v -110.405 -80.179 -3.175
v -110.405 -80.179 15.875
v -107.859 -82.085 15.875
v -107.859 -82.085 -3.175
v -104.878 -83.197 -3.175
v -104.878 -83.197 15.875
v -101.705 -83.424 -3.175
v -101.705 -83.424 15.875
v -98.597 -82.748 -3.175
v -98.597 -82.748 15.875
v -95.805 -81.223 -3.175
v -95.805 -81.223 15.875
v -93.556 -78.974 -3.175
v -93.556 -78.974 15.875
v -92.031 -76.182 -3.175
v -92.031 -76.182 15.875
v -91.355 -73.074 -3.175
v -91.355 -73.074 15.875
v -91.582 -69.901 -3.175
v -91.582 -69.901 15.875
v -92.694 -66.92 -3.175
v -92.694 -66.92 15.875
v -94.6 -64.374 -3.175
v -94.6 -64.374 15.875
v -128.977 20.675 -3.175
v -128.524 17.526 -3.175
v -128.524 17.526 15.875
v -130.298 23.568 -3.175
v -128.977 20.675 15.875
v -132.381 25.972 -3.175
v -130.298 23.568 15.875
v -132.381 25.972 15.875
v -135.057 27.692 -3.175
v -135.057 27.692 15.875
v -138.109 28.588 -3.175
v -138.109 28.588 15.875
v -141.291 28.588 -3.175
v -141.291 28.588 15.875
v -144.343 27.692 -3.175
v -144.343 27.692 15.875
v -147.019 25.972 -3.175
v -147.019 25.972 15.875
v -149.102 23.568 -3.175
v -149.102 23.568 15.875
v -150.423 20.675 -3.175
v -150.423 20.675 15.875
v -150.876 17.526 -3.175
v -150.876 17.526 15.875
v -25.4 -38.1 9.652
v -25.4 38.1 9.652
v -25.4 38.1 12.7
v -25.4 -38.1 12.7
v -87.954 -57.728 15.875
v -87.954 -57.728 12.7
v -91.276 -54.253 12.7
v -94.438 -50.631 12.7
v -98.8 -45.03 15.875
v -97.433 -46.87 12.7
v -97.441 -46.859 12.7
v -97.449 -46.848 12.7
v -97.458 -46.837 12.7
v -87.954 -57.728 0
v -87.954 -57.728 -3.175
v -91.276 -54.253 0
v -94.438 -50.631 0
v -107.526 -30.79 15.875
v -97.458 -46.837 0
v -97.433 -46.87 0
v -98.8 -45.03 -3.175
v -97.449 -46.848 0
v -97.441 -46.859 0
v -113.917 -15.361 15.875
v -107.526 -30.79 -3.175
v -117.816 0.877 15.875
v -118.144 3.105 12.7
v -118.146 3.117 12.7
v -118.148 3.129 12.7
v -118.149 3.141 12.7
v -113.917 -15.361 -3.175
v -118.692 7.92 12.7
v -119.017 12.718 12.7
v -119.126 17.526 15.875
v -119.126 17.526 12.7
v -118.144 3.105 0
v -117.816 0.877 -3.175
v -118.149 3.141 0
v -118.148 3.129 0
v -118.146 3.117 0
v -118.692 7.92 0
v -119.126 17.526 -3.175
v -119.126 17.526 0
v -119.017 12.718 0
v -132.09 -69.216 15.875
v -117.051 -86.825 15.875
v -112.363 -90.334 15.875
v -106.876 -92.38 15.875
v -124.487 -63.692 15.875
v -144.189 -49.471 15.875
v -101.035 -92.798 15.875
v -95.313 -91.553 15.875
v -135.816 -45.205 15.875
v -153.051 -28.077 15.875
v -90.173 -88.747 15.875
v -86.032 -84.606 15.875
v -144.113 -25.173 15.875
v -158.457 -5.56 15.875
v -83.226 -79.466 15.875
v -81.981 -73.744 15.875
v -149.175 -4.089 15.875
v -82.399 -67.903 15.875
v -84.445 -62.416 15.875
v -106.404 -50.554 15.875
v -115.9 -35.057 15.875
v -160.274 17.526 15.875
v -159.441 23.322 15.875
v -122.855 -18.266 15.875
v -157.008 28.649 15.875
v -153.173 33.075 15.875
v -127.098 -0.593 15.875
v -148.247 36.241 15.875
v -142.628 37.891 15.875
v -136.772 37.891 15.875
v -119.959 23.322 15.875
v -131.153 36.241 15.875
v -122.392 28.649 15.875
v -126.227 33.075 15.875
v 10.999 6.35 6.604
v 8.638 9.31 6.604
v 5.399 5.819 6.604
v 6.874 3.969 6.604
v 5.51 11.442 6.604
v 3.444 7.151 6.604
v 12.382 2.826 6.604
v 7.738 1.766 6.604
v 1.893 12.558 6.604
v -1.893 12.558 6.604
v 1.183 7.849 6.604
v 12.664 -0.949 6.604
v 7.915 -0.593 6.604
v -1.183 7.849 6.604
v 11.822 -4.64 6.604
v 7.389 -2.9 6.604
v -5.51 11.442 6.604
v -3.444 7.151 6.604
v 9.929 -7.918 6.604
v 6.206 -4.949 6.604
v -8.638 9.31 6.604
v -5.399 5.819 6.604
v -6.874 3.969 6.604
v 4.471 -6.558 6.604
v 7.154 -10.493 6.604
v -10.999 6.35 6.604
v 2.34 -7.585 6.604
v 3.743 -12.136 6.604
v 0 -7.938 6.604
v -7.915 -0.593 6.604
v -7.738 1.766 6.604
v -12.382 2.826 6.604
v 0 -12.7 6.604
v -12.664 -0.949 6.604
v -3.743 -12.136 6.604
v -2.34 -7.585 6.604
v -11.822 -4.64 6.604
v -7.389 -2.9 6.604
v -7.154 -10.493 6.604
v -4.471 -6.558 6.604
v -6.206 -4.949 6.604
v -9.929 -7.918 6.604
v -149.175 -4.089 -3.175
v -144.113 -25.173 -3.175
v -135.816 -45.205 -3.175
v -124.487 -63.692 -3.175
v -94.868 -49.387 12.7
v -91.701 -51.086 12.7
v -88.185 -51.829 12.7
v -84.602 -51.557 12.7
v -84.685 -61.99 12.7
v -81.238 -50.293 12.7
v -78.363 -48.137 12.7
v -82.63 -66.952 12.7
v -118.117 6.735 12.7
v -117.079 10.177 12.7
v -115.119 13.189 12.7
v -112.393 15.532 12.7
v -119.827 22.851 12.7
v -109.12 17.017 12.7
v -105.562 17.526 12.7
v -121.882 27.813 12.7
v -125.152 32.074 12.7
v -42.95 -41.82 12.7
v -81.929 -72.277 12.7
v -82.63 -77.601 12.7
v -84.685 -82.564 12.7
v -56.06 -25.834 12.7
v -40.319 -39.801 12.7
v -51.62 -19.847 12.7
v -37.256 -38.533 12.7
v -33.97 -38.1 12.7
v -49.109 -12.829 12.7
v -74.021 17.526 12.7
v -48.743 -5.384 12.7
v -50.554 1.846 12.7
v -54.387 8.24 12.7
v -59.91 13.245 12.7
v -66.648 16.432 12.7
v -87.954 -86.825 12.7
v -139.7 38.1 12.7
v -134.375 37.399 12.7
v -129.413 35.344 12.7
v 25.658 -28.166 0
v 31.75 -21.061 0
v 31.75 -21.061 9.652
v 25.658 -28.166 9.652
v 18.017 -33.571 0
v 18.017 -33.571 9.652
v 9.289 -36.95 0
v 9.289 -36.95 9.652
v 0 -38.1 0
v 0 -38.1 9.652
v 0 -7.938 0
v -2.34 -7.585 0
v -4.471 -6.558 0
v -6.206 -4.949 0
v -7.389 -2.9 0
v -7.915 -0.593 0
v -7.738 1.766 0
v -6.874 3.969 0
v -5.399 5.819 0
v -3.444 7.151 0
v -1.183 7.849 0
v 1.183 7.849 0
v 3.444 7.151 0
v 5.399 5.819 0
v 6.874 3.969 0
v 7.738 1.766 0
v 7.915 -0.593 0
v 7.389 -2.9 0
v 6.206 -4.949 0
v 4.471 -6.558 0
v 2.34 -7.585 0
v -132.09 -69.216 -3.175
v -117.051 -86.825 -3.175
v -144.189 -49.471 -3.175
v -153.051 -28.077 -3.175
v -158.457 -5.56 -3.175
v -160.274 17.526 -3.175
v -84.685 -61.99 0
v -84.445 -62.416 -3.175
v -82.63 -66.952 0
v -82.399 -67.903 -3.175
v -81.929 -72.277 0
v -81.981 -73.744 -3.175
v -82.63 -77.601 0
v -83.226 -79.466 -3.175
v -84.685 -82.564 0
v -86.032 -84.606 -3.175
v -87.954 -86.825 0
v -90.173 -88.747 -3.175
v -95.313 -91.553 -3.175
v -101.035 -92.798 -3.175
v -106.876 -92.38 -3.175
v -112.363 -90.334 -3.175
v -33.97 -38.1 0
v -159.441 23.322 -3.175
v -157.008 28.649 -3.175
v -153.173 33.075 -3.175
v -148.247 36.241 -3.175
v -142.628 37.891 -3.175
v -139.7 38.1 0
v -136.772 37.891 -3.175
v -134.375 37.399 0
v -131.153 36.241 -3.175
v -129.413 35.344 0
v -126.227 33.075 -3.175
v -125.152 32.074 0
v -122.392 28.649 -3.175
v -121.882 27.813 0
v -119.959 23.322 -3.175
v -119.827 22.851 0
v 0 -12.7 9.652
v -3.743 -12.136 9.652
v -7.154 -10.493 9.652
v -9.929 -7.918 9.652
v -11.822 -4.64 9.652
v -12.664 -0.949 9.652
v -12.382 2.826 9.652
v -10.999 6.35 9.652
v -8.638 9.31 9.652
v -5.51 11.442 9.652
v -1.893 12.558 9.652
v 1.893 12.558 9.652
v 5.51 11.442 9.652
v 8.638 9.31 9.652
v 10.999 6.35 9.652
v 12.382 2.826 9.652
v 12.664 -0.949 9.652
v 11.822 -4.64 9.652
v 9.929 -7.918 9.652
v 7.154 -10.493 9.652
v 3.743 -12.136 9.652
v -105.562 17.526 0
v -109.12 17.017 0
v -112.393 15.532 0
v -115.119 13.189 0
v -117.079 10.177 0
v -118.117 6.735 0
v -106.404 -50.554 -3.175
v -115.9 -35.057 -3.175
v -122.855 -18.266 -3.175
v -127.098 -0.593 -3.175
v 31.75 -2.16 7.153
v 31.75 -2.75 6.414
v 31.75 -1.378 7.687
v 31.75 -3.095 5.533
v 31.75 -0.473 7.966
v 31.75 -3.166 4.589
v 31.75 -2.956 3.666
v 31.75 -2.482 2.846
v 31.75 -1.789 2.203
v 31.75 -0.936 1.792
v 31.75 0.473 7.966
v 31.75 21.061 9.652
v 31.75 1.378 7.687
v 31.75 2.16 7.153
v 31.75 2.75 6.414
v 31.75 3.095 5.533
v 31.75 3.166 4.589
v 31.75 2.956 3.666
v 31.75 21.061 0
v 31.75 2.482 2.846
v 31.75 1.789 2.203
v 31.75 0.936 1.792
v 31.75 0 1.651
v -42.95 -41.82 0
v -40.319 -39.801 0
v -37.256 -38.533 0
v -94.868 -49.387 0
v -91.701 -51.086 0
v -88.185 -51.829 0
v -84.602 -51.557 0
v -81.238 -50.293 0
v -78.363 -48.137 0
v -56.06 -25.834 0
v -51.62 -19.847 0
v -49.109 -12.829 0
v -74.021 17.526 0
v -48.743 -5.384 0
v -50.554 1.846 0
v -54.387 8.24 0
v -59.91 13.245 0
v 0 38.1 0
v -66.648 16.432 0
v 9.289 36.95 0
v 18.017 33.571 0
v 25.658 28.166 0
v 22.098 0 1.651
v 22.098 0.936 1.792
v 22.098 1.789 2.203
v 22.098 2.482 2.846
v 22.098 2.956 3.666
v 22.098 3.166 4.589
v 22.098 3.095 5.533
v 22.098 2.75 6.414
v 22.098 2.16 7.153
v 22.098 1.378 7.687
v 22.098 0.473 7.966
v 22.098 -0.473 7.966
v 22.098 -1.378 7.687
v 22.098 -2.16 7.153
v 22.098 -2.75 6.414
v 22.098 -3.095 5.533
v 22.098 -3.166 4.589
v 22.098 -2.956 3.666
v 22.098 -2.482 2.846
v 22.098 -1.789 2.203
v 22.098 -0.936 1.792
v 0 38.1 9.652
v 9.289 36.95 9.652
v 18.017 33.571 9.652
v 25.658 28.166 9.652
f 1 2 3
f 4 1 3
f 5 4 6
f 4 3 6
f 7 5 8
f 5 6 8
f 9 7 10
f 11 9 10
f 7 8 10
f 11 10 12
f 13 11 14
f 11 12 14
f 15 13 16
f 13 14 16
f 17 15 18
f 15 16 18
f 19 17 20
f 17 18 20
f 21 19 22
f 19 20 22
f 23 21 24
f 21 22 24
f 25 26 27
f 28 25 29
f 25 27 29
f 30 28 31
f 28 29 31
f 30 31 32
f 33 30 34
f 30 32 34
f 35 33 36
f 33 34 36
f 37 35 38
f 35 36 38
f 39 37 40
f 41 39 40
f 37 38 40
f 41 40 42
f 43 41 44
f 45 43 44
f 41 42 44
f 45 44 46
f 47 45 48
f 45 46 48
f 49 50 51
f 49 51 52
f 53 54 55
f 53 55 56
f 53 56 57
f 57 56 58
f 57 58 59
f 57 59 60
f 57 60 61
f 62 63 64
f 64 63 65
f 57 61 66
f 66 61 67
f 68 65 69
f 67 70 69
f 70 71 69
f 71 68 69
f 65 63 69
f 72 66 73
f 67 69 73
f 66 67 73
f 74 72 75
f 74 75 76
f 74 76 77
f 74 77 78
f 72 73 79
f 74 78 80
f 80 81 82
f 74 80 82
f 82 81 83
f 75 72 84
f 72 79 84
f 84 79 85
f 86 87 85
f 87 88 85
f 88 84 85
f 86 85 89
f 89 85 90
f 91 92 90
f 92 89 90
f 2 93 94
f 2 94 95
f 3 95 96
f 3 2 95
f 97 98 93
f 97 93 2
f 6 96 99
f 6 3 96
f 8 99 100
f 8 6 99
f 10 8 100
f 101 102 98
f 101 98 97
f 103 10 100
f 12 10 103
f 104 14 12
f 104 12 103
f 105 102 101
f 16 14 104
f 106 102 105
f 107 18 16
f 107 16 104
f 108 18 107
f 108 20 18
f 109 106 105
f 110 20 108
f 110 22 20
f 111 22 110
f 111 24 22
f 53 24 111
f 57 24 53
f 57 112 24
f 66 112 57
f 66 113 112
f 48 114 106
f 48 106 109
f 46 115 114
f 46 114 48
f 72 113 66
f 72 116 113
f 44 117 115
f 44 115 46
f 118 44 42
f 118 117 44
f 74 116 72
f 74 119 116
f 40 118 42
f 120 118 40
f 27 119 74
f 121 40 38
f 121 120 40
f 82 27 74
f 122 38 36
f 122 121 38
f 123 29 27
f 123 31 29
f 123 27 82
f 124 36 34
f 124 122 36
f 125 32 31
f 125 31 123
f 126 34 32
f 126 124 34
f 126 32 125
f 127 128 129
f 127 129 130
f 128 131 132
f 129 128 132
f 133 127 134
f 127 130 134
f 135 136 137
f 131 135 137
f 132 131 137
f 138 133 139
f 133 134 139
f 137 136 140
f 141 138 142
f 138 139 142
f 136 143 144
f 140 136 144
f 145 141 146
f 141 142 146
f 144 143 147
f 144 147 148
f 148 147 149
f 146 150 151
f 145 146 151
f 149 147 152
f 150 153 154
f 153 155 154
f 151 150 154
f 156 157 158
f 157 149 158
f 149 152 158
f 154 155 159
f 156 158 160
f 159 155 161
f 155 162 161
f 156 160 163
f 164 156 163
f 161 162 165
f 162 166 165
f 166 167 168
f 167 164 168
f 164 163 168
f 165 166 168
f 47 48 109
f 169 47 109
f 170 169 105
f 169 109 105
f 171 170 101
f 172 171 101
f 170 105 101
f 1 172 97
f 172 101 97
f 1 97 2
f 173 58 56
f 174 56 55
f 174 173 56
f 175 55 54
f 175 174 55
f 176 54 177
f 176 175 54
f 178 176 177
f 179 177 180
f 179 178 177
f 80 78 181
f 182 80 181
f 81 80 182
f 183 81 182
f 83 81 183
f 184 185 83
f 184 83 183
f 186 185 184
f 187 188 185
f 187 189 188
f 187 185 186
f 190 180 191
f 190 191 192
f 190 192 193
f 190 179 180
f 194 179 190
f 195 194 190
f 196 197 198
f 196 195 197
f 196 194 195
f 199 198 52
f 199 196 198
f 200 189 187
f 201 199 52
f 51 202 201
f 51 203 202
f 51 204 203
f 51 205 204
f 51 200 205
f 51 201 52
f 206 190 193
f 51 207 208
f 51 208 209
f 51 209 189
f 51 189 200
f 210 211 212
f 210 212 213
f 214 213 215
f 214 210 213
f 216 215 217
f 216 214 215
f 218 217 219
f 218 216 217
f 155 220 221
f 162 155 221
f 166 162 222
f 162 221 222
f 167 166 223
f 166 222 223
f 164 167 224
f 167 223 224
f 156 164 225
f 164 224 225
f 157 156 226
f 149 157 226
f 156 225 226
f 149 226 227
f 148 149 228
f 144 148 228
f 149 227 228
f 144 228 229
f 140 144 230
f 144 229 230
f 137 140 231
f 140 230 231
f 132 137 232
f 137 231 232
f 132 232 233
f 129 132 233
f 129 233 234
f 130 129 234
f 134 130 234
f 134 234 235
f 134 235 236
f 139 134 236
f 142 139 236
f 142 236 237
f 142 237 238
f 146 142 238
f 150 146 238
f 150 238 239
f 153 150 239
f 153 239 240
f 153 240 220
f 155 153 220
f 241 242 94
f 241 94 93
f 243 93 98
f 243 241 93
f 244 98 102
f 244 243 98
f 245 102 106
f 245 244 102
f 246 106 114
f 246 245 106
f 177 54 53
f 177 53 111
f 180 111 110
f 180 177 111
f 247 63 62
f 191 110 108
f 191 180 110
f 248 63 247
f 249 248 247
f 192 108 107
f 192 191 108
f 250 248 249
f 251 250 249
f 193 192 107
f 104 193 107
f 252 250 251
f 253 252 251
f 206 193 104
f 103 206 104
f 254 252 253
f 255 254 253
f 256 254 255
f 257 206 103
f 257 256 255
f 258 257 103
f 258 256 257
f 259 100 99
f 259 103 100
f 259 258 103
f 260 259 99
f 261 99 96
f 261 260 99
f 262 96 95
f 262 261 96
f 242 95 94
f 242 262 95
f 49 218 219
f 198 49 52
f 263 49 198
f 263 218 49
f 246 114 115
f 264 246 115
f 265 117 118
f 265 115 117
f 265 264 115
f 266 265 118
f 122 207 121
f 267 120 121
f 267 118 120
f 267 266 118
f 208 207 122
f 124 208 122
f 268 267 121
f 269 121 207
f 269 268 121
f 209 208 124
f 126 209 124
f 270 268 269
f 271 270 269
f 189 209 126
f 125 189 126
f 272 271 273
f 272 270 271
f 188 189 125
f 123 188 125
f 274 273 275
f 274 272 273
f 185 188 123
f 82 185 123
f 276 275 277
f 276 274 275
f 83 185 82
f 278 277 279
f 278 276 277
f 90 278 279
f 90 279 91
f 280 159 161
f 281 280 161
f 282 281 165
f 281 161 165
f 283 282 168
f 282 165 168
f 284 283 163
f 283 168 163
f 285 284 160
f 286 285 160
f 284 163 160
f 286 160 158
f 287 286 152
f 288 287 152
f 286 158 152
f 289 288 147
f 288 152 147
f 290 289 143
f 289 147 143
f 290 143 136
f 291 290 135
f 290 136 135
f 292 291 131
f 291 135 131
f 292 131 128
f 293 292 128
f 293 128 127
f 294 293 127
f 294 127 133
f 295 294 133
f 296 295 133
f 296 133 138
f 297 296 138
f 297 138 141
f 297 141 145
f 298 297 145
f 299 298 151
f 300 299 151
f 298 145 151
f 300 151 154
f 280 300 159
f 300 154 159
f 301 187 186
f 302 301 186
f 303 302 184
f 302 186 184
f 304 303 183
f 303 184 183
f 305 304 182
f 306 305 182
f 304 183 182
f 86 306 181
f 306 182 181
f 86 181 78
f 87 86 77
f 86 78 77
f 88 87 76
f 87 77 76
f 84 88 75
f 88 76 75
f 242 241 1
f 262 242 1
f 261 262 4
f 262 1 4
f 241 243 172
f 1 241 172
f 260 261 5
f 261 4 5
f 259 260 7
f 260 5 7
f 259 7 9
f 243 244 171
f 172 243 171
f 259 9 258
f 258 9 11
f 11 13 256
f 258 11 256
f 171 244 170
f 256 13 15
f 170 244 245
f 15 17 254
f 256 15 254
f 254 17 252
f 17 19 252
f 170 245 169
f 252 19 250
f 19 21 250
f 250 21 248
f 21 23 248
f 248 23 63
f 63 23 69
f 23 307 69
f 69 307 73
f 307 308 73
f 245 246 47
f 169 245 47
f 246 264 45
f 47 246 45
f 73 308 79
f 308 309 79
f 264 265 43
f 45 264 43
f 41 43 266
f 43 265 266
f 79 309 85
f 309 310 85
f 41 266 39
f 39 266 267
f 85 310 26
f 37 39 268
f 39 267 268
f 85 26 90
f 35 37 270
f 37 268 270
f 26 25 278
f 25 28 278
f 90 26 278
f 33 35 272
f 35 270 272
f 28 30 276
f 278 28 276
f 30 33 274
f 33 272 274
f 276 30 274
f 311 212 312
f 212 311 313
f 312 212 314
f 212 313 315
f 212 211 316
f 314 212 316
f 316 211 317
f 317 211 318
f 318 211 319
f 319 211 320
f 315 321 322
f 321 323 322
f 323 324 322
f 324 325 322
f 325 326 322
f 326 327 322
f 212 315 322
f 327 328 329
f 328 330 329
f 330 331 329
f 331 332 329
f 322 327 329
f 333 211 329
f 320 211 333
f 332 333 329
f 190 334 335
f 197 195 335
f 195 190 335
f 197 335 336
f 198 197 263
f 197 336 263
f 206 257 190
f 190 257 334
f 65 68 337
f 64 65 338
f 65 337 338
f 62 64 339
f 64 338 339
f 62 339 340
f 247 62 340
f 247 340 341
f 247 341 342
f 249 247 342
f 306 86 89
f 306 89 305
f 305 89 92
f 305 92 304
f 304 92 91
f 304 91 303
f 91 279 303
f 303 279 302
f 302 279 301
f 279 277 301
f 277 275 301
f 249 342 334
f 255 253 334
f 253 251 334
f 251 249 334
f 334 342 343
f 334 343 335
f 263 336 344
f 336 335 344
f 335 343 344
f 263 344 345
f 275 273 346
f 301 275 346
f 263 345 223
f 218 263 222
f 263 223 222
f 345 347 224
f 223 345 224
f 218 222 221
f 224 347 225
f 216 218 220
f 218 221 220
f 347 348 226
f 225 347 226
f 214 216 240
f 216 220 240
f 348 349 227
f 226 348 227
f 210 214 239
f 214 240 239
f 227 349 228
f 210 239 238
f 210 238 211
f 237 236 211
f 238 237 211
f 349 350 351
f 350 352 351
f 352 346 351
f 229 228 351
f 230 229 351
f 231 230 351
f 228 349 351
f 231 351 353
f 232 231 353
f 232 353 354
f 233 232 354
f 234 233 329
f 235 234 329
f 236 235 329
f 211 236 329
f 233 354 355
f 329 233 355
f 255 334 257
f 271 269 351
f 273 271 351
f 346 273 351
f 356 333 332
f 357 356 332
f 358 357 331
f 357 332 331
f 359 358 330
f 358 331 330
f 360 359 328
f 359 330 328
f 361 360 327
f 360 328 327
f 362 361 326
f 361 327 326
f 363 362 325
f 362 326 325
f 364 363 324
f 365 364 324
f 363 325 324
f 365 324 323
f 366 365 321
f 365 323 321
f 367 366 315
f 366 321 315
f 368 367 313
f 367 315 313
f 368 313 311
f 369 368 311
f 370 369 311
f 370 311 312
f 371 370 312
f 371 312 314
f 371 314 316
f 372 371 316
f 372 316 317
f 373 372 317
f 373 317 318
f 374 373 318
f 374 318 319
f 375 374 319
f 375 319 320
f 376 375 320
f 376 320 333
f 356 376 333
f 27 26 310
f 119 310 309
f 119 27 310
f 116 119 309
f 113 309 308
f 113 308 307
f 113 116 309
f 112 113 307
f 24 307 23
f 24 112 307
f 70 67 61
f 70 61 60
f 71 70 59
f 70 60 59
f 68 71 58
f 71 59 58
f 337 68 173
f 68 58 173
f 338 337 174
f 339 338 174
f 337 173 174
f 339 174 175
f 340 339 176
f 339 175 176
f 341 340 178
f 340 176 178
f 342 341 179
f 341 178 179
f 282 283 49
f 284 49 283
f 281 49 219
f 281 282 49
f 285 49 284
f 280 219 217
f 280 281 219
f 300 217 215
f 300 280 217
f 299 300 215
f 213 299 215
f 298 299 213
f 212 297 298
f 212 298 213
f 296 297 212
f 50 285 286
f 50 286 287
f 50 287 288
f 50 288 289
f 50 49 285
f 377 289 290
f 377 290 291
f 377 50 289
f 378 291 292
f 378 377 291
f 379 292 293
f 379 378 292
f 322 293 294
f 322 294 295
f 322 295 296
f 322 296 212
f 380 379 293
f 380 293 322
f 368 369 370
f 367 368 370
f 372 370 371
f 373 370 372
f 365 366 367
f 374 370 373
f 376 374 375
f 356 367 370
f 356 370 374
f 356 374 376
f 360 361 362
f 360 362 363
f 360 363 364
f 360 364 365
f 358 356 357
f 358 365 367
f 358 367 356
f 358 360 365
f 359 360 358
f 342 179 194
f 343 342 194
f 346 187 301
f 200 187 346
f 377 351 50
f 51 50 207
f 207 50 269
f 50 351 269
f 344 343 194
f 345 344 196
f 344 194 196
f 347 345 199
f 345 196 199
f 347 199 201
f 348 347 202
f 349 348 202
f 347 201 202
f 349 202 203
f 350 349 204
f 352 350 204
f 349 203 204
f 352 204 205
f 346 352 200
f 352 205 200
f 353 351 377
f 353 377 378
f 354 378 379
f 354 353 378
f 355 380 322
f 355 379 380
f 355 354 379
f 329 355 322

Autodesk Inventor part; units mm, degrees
sketch "Boceto1" plane through (0, 0, 0) normal (0, 0, 1) x (1, 0, 0)
  line L0 (-37.2583, 0) -> (45.75, 0) construction
  line L1 (0, -58.9269) -> (0, 58.9269) construction
  line L2 (31.75, -21.0606) -> (31.75, 21.0606)
  line L3 (0, 38.1) -> (-25.4, 38.1)
  line L4 (0, -38.1) -> (-25.4, -38.1)
  arc A0 (31.75, 21.0606) -> (0, 38.1) centre (0, 0) ccw
  arc A1 (0, -38.1) -> (31.75, -21.0606) centre (0, 0) ccw
  line L5 (-25.4, 38.1) -> (-25.4, -38.1)
  dimension "d2" = 31.75
  dimension "d3" = 25.4
extrude "Cabezal" add sketch "Boceto1" along normal blind 9.652
sketch "Boceto3" plane through (0, 0, 9.652) normal (0, 0, 1) x (1, 0, 0)
  point P0 (0, 0)
  point P1 (0, 0)
hole "Broca y barreno" at (0, 0, 9.652) direction (0, 0, -1) diameter 15.875 end through all counterbore diameter 25.4 counterbore depth 3.048
sketch "Boceto4" plane through (0, 0, 0) normal (0, 0, 1) x (1, 0, 0)
  line L0 (-36.83, 0) -> (43.18, 0) construction
  line L1 (0, -53.34) -> (0, 53.34) construction
  line L2 (-12.7, 17.526) -> (-227.4102, 17.526) construction
  arc A0 (-119.126, 17.526) -> (-160.274, 17.526) centre (-139.7, 17.526) ccw
  line L3 (-12.7, 17.526) -> (-138.4236, -108.1976) construction
  line L4 (-12.7, 17.526) -> (165.1, 17.526) construction
  arc A1 (-117.0506, -86.8246) -> (-87.9545, -57.7285) centre (-102.5026, -72.2766) ccw
  arc A2 (-160.274, 17.526) -> (-117.0506, -86.8246) centre (-12.7, 17.526) ccw
  arc A3 (-119.126, 17.526) -> (-87.9545, -57.7285) centre (-12.7, 17.526) ccw
  line L5 (-25.4, 38.1) -> (-25.4, -38.1) projected
  point P0 (0, 0)
  dimension "d14" = 17.526
  dimension "d15" = 12.7
  dimension "d19" = 41.148
  dimension "d21" = 135
  dimension "d22" = 41.148
  dimension "d25" = 12.7
extrude "Mango" add sketch "Boceto4" along normal blind 15.875 and the other way blind 3.175
sketch "Boceto8" plane through (31.75, -21.0606, 0) normal (1, 0, 0) x (0, 0, -1)
  circle A0 centre (-4.826, 21.0606) radius 3.175
  line L0 (-9.652, 0) -> (-9.652, 42.1211) construction
  line L1 (0, 0) -> (-9.652, 0) construction
  line L2 (0, 42.1211) -> (-9.652, 42.1211) construction
  line L3 (-6.604, 33.7606) -> (-6.604, 8.3606) projected
  line L4 (-6.604, 28.9981) -> (-6.604, 13.1231) projected
  point P0 (0, 21.0606)
  dimension "d36" = 6.35
  dimension "d37" = 4.826
  dimension "d38" = 42.1211
  dimension "d39" = 21.0606
extrude "AgujeroLateral" cut sketch "Boceto8" against normal blind 9.652
sketch "Boceto9" plane through (0, 0, 0) normal (0, 0, 1) x (1, 0, 0)
  arc A0 (-160.274, 17.526) -> (-119.126, 17.526) centre (-139.7, 17.526) ccw projected
  line L0 (-25.4, 38.1) -> (-25.4, -38.1) projected
  line L1 (-139.7, 38.1) -> (-25.4, 38.1)
  arc A1 (-119.126, 17.526) -> (-160.274, 17.526) centre (-139.7, 17.526) ccw projected
  line L2 (-25.4, -38.1) -> (0, -38.1) projected
  line L3 (-25.4, 38.1) -> (-25.4, -38.1)
  line L4 (-25.4, -38.1) -> (-33.9695, -38.1)
  arc A2 (-87.9545, -57.7285) -> (-117.0506, -86.8246) centre (-102.5026, -72.2766) ccw projected
  arc A3 (-160.274, 17.526) -> (-117.0506, -86.8246) centre (-12.7, 17.526) ccw projected
  arc A4 (-117.0506, -86.8246) -> (-87.9545, -57.7285) centre (-102.5026, -72.2766) ccw projected
  arc A5 (-119.126, 17.526) -> (-87.9545, -57.7285) centre (-12.7, 17.526) ccw projected
  arc A6 (-119.126, 17.526) -> (-160.274, 17.526) centre (-139.7, 17.526) ccw projected
  line L5 (10.5292, 11.6592) -> (185.2985, 11.6592) construction
  arc A7 (-117.0506, -86.8246) -> (-87.9545, -57.7285) centre (-102.5026, -72.2766) ccw construction
  line L6 (-87.9545, -86.8246) -> (-42.9497, -41.8197)
  line L7 (-139.7, 17.526) -> (0, 17.526) construction
  line L8 (0, 17.526) -> (-119.126, -101.6) construction
  arc A8 (-33.9695, -38.1) -> (-42.9497, -41.8197) centre (-33.9695, -50.8) ccw
  line L9 (-25.4, 38.1) -> (-25.4, -38.1)
  arc A9 (-87.9545, -57.7285) -> (-119.126, 17.526) centre (-12.7, 17.526) ccw projected
  arc A10 (-119.126, 17.526) -> (-87.9545, -57.7285) centre (-12.7, 17.526) ccw
  circle A11 centre (-139.7, 17.526) radius 20.574
  circle A12 centre (-102.5026, -72.2766) radius 20.574
  point P0 (0, 0)
  point P1 (-87.9545, -57.7285)
  point P2 (-119.126, 17.526)
  dimension "d47" = 45
  dimension "d48" = 12.7
extrude "BloqueCentral" add sketch "Boceto9" along normal blind 12.7 contours A9 L1 L0 L4 A8 L6 A5 | A1 L1 A9 | A9 L6 A4
sketch "Boceto10" plane through (0, 0, 15.875) normal (0, 0, 1) x (1, 0, 0)
  arc A0 (-160.274, 17.526) -> (-117.0506, -86.8246) centre (-12.7, 17.526) ccw construction
  arc A1 (-117.0506, -86.8246) -> (-87.9545, -57.7285) centre (-102.5026, -72.2766) ccw construction
  arc A2 (-119.126, 17.526) -> (-87.9545, -57.7285) centre (-12.7, 17.526) ccw construction
  arc A3 (-119.126, 17.526) -> (-160.274, 17.526) centre (-139.7, 17.526) ccw construction
  arc A4 (-150.876, 17.526) -> (-110.4052, -80.1792) centre (-12.7, 17.526) ccw
  arc A5 (-110.4052, -80.1792) -> (-94.5999, -64.3739) centre (-102.5026, -72.2766) ccw
  arc A6 (-128.524, 17.526) -> (-94.5999, -64.3739) centre (-12.7, 17.526) ccw
  arc A7 (-128.524, 17.526) -> (-150.876, 17.526) centre (-139.7, 17.526) ccw
  point P0 (0, 0)
  dimension "d52" = 22.352
extrude "HuecoMango" cut sketch "Boceto10" against normal blind 22.352
sketch "Boceto11" plane through (0, 0, 12.7) normal (0, 0, 1) x (1, 0, 0)
  arc A0 (-105.5616, 17.526) -> (-118.1445, 3.1051) centre (-105.5616, 4.826) ccw
  arc A1 (-97.4576, -46.8374) -> (-78.3631, -48.1371) centre (-87.3433, -39.1568) ccw
  arc A2 (-56.0605, -25.8345) -> (-74.021, 17.526) centre (-74.021, -7.874) ccw
  arc A3 (-128.524, 17.526) -> (-150.876, 17.526) centre (-139.7, 17.526) ccw construction
  arc A4 (-128.524, 17.526) -> (-94.5999, -64.3739) centre (-12.7, 17.526) ccw construction
  arc A5 (-110.4052, -80.1792) -> (-94.5999, -64.3739) centre (-102.5026, -72.2766) ccw construction
  arc A6 (-150.876, 17.526) -> (-110.4052, -80.1792) centre (-12.7, 17.526) ccw construction
  arc A7 (-119.126, 17.526) -> (-160.274, 17.526) centre (-139.7, 17.526) ccw construction
  arc A8 (-160.274, 17.526) -> (-117.0506, -86.8246) centre (-12.7, 17.526) ccw construction
  arc A9 (-117.0506, -86.8246) -> (-87.9545, -57.7285) centre (-102.5026, -72.2766) ccw construction
  arc A10 (-119.126, 17.526) -> (-87.9545, -57.7285) centre (-12.7, 17.526) ccw construction
  line L0 (-139.7, 17.526) -> (-12.7, 17.526) construction
  line L1 (-12.7, 17.526) -> (-102.5026, -72.2766) construction
  arc A11 (-119.126, 17.526) -> (-87.9545, -57.7285) centre (-12.7, 17.526) ccw projected
  line L2 (-150.876, 17.526) -> (-150.876, 17.526)
  line L3 (-110.0905, -79.8645) -> (-110.4052, -80.1792)
  line L4 (-78.3631, -48.1371) -> (-56.0605, -25.8345)
  line L5 (-105.5616, 17.526) -> (-74.021, 17.526)
  arc A12 (-118.1445, 3.1051) -> (-97.4576, -46.8374) centre (-12.7, 17.526) ccw
  line L6 (-87.9545, -86.8246) -> (-42.9497, -41.8197) projected
  line L7 (-25.4, 38.1) -> (-139.7, 38.1) projected
  point P0 (0, 0)
  dimension "d57" = 25.4
  dimension "d58" = 25.4
  dimension "d59" = 50.8
  dimension "d60" = 20.574
  dimension "d61" = 20.574
extrude "HuecoCentral" cut sketch "Boceto11" against normal blind 12.7
equation "\"d39\" = 0.5 * d38"
properties part number "Pieza2A01209499"
